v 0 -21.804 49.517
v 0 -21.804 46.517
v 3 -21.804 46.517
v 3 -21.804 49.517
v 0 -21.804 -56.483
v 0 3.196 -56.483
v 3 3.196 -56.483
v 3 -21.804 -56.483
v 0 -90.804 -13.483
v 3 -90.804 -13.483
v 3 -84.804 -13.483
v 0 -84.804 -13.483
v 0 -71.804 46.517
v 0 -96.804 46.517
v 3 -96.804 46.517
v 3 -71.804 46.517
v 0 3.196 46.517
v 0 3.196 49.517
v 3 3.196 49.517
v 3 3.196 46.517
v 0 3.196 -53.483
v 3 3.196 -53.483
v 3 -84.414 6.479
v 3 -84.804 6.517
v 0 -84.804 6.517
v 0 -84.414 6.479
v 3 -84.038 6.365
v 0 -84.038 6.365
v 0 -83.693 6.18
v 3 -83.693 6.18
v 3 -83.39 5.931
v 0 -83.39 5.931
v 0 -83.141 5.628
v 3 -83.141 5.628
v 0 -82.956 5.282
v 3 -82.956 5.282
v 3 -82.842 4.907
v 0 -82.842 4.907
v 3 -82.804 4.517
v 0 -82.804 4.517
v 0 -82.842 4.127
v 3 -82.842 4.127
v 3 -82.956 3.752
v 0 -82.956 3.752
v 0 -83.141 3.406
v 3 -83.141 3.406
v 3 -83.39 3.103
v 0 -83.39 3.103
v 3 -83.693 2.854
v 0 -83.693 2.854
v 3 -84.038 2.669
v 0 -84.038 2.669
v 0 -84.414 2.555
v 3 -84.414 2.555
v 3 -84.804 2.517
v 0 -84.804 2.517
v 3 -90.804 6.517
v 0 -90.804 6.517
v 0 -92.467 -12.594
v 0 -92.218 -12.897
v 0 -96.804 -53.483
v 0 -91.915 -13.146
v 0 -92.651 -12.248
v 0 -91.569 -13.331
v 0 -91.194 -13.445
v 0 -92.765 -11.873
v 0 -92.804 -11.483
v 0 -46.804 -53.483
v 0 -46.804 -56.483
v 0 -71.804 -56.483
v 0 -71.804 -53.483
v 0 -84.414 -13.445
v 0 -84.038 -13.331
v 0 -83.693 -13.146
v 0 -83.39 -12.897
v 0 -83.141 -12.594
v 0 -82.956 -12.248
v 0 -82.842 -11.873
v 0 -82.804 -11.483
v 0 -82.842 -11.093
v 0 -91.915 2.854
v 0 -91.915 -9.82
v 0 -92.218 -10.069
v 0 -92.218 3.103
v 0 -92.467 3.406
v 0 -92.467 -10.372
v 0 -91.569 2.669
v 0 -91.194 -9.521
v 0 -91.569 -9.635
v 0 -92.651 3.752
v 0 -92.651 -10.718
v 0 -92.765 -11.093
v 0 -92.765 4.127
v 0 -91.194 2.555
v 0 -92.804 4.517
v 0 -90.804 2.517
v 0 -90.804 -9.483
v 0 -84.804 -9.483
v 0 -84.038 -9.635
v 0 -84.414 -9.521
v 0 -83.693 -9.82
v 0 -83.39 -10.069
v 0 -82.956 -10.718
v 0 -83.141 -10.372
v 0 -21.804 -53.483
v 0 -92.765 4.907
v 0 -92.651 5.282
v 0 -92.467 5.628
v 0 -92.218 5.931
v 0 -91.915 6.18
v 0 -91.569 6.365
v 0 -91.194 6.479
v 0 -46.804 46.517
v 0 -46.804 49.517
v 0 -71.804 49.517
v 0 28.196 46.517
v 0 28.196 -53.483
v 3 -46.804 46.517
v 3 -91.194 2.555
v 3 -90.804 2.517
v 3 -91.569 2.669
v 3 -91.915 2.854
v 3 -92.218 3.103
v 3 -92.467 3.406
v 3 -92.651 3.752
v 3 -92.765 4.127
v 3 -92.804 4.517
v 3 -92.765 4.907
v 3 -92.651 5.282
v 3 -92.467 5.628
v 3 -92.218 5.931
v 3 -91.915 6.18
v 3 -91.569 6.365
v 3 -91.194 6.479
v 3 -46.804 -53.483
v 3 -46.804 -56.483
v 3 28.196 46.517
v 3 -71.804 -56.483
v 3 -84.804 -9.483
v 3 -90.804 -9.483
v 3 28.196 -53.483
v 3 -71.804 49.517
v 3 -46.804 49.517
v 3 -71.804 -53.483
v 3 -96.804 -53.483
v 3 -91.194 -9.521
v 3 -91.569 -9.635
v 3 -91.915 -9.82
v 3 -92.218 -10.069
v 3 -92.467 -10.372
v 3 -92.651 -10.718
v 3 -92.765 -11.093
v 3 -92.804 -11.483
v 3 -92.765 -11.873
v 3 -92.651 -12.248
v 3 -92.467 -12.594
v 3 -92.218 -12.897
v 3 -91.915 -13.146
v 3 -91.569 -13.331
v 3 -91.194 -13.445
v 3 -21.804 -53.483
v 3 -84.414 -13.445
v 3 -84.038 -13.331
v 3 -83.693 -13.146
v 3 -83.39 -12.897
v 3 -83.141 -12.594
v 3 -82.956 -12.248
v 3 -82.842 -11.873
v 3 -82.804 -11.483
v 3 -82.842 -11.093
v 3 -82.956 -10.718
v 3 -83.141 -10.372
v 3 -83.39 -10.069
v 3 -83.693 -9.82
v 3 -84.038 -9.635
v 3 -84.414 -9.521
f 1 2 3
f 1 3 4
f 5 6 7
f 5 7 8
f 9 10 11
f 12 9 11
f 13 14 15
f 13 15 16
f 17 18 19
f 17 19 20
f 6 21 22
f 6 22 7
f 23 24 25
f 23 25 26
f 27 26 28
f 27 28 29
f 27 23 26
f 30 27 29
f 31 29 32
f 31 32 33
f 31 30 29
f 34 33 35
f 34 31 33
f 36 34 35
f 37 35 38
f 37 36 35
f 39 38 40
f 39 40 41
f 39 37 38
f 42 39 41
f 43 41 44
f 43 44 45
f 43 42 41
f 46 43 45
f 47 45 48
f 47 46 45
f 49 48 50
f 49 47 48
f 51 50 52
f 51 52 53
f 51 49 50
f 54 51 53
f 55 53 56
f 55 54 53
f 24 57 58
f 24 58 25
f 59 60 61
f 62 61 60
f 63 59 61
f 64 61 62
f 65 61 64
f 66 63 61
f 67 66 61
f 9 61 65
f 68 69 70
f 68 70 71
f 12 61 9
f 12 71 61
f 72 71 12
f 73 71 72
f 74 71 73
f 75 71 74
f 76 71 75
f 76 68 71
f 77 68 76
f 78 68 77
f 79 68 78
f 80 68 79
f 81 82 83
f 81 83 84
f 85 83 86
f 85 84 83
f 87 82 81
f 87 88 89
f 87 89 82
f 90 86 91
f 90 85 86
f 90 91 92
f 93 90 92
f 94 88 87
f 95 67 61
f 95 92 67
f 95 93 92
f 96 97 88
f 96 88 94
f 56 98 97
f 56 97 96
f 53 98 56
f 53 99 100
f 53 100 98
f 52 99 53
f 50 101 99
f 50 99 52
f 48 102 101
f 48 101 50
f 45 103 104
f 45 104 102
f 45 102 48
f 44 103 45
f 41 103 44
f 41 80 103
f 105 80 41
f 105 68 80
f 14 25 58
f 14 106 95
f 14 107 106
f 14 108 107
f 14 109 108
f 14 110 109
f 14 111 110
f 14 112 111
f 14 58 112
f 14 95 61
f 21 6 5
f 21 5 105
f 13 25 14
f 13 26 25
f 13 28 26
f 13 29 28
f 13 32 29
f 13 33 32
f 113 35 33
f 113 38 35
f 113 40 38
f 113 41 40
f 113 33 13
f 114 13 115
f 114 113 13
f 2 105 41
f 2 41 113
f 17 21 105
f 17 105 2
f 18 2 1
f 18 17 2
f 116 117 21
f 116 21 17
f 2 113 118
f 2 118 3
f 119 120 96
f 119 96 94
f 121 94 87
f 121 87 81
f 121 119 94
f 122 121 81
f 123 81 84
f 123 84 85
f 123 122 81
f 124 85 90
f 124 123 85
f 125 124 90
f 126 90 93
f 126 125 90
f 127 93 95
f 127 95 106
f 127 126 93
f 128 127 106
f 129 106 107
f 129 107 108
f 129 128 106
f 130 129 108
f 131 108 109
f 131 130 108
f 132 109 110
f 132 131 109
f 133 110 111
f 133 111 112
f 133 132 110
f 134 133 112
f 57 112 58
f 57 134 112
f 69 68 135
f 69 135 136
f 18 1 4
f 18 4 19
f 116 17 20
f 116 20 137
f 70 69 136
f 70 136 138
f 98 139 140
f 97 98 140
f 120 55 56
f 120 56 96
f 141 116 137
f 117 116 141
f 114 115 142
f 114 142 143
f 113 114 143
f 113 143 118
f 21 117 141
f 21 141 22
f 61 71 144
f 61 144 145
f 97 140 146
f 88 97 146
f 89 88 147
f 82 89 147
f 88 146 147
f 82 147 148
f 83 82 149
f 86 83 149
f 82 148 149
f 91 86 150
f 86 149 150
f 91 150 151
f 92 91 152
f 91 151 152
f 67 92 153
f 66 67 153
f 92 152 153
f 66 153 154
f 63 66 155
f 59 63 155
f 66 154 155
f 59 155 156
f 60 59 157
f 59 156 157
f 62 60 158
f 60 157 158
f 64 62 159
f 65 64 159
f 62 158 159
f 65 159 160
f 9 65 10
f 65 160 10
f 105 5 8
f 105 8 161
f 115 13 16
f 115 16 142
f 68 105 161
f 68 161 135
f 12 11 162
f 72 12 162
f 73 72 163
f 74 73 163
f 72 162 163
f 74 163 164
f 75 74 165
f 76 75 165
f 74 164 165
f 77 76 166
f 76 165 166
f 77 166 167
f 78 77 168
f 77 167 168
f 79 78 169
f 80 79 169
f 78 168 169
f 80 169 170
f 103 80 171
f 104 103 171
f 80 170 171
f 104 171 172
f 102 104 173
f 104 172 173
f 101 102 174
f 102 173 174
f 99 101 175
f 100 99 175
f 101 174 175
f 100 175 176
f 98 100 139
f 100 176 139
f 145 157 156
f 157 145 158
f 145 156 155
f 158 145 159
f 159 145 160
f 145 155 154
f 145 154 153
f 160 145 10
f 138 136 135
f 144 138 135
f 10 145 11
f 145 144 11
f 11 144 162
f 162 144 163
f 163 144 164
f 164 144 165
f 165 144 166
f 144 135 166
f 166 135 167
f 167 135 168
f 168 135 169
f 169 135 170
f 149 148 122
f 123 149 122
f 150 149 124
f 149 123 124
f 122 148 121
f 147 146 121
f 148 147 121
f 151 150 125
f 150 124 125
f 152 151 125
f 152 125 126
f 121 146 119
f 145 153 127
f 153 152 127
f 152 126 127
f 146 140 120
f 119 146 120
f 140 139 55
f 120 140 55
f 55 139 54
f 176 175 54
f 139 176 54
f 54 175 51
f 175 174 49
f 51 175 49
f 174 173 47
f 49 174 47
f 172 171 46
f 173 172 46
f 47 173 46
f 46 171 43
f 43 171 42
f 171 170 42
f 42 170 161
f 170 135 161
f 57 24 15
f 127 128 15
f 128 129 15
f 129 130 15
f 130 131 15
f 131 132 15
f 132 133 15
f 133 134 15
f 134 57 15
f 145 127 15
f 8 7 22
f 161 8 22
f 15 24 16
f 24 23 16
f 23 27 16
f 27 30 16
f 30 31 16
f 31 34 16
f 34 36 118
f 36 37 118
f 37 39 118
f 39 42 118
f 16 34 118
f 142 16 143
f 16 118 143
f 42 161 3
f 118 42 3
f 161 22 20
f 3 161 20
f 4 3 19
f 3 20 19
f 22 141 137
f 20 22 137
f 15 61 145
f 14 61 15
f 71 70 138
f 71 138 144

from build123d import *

# Parameters (mm, degrees)
SALIENTE_EXTRUIR1_DEPTH = 3
CORTAR_EXTRUIR1_DEPTH   = 3


with BuildPart() as part:
    # Croquis1 → Saliente-Extruir1 (new body)
    with BuildSketch(Plane(origin=(0, 0, 0), x_dir=(0, 0, -1), z_dir=(1, 0, 0))):
        Polygon((-46.517058898, 28.196284567), (53.482941102, 28.196284567), (53.482941102, 3.196284567), (56.482941102, 3.196284567), (56.482941102, -21.803715433), (53.482941102, -21.803715433), (53.482941102, -46.803715433), (56.482941102, -46.803715433), (56.482941102, -71.803715433), (53.482941102, -71.803715433), (53.482941102, -96.803715433), (-46.517058898, -96.803715433), (-46.517058898, -71.803715433), (-49.517058898, -71.803715433), (-49.517058898, -46.803715433), (-46.517058898, -46.803715433), (-46.517058898, -21.803715433), (-49.517058898, -21.803715433), (-49.517058898, 3.196284567), (-46.517058898, 3.196284567), align=None)
    extrude(amount=SALIENTE_EXTRUIR1_DEPTH)

    # Croquis2 → Cortar-Extruir1 (cut)
    with BuildSketch(Plane(origin=(3, 0, 0), x_dir=(0, 0, -1), z_dir=(1, 0, 0))):
        with BuildLine():
            Line((-6.517058898, -90.803715433), (-6.517058898, -84.803715433))
            ThreePointArc((-6.517058898, -84.803715433), (-4.517058898, -82.803715433), (-2.517058898, -84.803715433))
            Line((-2.517058898, -84.803715433), (-2.517058898, -90.803715433))
            ThreePointArc((-2.517058898, -90.803715433), (-4.517058898, -92.803715433), (-6.517058898, -90.803715433))
        make_face()
        with BuildLine():
            Line((13.482941102, -90.803715433), (13.482941102, -84.803715433))
            ThreePointArc((13.482941102, -84.803715433), (11.482941102, -82.803715433), (9.482941102, -84.803715433))
            Line((9.482941102, -84.803715433), (9.482941102, -90.803715433))
            ThreePointArc((9.482941102, -90.803715433), (11.482941102, -92.803715433), (13.482941102, -90.803715433))
        make_face()
    extrude(amount=-CORTAR_EXTRUIR1_DEPTH, mode=Mode.SUBTRACT)


solid = part.part
